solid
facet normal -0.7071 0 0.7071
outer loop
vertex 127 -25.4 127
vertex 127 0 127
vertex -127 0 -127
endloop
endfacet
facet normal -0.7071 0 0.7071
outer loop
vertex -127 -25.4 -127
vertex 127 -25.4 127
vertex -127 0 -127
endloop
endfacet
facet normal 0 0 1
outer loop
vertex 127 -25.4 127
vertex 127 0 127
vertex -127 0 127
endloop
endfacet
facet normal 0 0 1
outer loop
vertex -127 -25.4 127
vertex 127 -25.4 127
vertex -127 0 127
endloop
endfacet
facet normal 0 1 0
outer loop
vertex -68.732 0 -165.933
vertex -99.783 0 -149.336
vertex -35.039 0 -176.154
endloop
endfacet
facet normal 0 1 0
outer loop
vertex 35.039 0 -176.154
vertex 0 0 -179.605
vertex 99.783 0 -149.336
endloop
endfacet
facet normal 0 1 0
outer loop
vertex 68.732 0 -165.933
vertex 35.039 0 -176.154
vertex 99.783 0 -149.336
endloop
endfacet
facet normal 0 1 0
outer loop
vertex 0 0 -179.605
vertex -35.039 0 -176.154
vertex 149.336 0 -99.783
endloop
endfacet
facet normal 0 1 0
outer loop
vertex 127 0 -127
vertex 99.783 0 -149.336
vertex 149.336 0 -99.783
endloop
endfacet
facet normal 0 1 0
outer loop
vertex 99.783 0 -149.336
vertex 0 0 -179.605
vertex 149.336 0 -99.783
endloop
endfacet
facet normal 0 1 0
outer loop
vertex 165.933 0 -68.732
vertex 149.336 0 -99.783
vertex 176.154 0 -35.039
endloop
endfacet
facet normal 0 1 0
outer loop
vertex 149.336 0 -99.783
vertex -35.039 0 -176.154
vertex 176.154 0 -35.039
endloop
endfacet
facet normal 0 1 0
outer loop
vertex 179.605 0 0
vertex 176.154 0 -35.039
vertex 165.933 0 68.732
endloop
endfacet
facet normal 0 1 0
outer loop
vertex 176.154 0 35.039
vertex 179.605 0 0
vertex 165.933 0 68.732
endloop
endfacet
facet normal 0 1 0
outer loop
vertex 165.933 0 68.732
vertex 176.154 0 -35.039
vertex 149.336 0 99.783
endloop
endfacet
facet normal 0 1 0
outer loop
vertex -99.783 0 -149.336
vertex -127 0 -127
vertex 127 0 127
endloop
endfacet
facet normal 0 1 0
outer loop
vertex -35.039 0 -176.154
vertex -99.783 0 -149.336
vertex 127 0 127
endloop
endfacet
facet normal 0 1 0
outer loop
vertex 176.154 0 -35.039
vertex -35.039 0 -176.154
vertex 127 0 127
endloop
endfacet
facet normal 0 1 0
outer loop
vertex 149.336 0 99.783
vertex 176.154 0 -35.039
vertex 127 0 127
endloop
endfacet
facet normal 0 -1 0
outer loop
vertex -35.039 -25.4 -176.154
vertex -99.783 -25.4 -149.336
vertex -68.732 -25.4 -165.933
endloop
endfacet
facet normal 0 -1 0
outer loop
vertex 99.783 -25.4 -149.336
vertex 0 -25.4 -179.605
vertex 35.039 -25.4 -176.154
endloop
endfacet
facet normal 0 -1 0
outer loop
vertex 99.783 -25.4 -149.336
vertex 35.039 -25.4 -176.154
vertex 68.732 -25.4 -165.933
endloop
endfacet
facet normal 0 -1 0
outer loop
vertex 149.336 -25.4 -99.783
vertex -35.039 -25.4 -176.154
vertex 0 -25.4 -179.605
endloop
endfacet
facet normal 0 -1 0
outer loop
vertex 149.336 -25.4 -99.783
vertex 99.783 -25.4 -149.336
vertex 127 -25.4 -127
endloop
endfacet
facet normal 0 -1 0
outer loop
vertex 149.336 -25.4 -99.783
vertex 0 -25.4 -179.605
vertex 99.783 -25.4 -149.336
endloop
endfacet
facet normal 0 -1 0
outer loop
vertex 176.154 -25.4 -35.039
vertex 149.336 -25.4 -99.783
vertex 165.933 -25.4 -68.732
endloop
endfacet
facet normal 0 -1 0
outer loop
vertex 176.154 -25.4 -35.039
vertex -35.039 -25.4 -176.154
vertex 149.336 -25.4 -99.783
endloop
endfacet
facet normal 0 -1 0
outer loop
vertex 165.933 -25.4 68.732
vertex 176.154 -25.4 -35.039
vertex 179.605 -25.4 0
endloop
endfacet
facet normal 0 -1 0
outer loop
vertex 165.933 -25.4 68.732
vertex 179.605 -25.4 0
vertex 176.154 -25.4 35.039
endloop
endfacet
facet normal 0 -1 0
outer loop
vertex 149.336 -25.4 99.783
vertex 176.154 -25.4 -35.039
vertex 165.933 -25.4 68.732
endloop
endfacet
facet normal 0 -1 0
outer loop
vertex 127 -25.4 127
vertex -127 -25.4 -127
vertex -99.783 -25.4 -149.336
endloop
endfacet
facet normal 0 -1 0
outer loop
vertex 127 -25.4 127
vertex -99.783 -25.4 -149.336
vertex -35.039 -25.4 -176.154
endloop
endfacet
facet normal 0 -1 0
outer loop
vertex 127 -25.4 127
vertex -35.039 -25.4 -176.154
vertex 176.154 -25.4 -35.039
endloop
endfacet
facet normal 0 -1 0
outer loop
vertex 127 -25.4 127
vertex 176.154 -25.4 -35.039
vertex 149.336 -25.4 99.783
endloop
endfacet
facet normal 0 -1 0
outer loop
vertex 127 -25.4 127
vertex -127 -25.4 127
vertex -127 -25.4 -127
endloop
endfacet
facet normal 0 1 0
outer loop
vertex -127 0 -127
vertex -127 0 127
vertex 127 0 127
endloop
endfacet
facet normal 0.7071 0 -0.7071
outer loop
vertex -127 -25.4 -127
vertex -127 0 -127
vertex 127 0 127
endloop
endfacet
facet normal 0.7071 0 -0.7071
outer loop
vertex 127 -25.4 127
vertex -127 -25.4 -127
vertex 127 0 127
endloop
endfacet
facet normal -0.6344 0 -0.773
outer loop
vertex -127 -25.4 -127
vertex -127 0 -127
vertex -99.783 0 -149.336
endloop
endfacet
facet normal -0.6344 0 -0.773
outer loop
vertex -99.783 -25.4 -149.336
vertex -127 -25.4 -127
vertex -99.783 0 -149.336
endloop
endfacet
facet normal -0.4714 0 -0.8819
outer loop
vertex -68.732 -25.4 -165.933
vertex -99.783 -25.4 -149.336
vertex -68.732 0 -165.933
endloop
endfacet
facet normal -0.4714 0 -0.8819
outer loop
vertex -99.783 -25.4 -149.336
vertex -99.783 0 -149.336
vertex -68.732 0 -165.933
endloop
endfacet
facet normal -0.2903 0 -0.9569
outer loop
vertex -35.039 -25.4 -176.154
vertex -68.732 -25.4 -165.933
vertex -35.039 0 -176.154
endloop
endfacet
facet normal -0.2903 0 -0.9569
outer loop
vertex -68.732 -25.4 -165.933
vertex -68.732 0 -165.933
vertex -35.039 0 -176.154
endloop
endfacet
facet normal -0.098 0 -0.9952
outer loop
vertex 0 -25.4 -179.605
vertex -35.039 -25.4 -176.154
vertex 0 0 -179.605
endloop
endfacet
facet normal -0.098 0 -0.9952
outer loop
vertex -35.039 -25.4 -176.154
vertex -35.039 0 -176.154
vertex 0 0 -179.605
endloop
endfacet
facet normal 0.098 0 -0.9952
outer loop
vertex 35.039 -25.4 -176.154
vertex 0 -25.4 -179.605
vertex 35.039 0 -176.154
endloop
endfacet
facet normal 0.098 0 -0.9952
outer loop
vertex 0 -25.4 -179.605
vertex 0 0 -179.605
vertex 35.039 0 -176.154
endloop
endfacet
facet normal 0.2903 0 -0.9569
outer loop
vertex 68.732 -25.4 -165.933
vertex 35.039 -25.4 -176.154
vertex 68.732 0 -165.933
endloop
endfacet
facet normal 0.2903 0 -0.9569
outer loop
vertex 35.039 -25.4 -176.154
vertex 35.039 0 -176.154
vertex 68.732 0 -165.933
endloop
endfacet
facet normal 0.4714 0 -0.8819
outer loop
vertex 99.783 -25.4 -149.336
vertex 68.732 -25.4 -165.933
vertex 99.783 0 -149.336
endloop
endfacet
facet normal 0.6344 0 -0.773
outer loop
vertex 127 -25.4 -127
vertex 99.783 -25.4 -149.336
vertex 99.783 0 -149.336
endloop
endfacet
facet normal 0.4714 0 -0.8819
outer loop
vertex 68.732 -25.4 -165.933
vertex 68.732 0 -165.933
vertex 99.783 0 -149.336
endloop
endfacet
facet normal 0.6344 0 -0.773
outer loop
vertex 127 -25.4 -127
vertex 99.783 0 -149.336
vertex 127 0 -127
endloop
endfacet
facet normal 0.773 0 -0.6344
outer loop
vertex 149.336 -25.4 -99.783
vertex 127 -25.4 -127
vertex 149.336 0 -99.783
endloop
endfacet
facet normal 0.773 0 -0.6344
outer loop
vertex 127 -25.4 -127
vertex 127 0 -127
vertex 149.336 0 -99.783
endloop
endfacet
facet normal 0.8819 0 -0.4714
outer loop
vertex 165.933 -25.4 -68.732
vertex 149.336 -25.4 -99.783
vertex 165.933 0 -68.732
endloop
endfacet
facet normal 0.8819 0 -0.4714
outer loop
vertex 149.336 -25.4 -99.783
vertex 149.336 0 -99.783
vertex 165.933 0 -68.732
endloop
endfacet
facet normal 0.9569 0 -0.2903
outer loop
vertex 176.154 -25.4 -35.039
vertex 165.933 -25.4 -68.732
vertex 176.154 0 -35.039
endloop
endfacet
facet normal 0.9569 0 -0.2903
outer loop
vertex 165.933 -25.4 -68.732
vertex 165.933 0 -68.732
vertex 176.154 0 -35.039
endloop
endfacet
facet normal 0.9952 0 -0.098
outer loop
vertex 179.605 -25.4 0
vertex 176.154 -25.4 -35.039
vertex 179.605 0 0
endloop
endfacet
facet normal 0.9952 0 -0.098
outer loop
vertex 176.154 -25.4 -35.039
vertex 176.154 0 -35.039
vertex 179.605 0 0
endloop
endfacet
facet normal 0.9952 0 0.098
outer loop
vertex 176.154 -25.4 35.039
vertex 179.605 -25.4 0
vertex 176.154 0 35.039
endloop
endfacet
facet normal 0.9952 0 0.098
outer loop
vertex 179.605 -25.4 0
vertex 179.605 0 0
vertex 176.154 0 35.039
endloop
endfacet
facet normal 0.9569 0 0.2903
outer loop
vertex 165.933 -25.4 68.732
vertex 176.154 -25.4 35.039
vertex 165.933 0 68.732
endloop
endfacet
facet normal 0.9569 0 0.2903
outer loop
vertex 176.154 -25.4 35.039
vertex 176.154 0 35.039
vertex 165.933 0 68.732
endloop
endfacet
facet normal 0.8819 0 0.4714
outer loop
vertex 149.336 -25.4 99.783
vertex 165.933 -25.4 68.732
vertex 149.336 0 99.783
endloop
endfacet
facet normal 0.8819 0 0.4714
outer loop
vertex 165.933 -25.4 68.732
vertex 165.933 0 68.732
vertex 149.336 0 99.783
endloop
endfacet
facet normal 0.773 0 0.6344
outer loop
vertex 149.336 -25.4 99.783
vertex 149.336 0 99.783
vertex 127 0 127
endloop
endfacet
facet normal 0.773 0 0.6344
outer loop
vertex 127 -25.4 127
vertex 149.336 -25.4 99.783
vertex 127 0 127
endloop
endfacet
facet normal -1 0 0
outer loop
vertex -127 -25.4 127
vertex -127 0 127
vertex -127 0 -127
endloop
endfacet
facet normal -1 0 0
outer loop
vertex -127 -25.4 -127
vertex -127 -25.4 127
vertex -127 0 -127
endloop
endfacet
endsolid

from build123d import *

# Parameters (mm, degrees)
F1_DEPTH = 25.4
F2_DEPTH = 25.4


with BuildPart() as f1:
    # F0 (on Front) → F1 (new body)
    with BuildSketch(Plane.XZ):
        Polygon((-127, -127), (127, 127), (-127, 127), align=None)
    extrude(amount=F1_DEPTH)


with BuildPart() as f2:
    # F0 (on Front) → F2 (new body)
    with BuildSketch(Plane.XZ):
        with BuildLine():
            ThreePointArc((-127, -127), (127, -127), (127, 127))
            Line((127, 127), (-127, -127))
        make_face()
    extrude(amount=F2_DEPTH)


solid = Compound([f1.part, f2.part])
